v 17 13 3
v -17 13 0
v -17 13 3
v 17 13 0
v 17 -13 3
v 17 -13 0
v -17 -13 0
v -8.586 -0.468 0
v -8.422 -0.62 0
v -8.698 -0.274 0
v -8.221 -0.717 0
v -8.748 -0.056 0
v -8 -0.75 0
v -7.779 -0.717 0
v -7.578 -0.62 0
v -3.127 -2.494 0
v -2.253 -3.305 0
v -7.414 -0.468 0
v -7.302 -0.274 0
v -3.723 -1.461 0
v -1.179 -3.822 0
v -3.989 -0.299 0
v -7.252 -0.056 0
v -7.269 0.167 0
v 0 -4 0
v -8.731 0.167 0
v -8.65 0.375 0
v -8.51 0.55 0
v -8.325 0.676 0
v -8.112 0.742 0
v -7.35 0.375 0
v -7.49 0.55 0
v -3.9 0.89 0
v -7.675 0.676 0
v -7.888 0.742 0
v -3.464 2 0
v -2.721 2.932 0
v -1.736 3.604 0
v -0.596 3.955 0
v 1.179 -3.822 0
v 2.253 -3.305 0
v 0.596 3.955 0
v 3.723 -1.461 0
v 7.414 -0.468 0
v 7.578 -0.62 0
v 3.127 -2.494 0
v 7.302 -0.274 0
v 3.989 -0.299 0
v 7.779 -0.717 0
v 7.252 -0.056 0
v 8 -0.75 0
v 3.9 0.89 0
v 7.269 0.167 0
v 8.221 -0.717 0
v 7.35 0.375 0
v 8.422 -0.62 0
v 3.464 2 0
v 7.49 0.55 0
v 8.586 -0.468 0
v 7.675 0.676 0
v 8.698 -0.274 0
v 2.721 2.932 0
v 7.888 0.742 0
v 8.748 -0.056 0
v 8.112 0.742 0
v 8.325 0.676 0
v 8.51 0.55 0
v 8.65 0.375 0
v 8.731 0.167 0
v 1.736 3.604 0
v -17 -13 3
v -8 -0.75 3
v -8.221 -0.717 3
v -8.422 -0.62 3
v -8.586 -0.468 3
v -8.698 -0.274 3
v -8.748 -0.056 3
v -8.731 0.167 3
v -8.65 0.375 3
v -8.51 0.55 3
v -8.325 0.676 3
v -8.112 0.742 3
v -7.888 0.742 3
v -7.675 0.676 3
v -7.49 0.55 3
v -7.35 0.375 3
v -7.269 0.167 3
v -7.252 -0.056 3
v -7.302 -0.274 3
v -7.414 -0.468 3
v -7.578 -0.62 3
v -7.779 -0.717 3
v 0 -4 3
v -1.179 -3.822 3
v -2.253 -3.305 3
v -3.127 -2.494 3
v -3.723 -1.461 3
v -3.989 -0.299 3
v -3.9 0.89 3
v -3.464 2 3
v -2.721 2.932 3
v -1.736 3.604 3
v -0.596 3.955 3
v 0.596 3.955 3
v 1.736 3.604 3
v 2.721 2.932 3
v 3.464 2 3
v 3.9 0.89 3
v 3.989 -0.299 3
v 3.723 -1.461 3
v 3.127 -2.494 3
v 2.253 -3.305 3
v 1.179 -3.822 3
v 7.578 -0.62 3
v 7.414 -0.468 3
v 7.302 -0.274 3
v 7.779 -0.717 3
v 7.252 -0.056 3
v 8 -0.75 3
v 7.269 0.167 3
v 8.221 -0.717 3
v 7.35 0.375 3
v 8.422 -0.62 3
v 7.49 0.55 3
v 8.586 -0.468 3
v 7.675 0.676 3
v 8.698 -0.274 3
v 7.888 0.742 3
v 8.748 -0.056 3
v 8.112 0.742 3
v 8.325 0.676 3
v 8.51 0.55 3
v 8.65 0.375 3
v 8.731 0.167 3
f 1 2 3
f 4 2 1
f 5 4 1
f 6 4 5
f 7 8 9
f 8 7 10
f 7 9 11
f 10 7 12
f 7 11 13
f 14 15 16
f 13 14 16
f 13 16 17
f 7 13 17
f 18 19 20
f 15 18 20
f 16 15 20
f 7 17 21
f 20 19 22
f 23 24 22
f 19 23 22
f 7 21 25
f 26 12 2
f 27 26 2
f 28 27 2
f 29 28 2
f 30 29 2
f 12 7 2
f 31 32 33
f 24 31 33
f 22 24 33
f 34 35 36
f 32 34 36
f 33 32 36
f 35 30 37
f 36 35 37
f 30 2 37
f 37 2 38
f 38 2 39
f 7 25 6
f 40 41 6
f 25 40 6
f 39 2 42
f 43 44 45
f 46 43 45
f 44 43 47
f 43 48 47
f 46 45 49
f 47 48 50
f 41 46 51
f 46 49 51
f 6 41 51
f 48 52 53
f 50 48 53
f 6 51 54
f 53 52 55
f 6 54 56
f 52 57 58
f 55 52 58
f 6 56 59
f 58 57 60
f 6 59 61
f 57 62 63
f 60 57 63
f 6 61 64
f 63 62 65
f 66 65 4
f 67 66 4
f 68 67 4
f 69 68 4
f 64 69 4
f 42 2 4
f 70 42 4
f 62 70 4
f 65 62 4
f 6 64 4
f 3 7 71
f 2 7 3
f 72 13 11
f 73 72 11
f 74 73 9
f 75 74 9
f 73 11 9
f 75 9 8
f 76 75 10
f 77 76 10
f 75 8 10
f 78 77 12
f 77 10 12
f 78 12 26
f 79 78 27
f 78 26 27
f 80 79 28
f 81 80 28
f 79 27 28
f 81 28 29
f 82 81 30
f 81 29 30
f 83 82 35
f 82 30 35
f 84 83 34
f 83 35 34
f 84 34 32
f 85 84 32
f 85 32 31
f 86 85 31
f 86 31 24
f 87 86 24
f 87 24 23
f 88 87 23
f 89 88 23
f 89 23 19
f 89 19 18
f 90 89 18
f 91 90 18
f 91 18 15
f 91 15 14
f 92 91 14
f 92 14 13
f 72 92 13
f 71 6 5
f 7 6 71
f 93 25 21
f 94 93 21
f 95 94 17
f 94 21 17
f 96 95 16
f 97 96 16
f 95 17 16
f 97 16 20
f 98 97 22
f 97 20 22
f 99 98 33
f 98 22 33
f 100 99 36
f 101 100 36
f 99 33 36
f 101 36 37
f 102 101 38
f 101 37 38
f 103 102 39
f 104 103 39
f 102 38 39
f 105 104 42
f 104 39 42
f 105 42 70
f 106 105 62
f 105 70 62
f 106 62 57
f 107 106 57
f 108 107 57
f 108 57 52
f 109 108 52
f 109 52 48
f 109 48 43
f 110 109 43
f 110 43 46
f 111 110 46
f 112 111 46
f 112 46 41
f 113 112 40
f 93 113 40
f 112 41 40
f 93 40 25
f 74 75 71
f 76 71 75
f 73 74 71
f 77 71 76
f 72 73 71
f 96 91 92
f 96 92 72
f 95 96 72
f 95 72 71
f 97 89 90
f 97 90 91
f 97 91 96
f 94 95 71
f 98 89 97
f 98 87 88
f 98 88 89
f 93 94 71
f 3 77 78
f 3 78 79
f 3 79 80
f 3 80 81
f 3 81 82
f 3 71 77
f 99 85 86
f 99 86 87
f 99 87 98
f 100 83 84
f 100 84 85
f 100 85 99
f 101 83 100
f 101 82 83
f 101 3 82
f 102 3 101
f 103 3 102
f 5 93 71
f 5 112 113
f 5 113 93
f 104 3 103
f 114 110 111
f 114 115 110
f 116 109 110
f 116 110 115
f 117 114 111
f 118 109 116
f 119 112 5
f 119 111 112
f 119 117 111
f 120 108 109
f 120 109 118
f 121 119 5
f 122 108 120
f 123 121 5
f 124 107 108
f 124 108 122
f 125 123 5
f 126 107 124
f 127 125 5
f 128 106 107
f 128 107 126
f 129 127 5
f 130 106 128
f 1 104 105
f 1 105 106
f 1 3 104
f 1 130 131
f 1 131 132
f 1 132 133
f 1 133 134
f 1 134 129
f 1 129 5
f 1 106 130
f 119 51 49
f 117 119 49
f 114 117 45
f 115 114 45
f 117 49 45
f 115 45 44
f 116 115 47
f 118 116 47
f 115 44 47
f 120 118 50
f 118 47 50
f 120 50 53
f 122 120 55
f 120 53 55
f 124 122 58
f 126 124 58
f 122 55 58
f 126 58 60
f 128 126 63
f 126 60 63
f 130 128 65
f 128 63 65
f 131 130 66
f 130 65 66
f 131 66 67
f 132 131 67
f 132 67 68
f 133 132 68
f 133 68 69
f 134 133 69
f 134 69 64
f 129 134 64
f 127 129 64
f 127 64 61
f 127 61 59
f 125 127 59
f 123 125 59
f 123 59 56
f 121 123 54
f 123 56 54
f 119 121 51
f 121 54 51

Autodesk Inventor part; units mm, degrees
ref_plane "YZ Plane" through (0, 0, 0) normal (1, 0, 0) x (0, 1, 0)
ref_plane "XZ Plane" through (0, 0, 0) normal (0, 1, 0) x (-1, 0, 0)
ref_plane "XY Plane" through (0, 0, 0) normal (0, 0, 1) x (1, 0, 0)
sketch "Sketch1" plane through (0, 0, 0) normal (0, 0, 1) x (1, 0, 0)
  line L0 (17, -13) -> (-17, -13)
  line L1 (-17, -13) -> (-17, 13)
  line L2 (-17, 13) -> (17, 13)
  line L3 (17, 13) -> (17, -13)
  line L4 (17, -13) -> (-17, 13) construction
  line L5 (-17, -13) -> (17, 13) construction
  point P0 (0, 0)
  dimension "d0" = 34
  dimension "d1" = 26
extrude "Extrusion1" add sketch "Sketch1" along normal blind 3
sketch "Sketch3" plane through (0, 0, 3) normal (0, 0, 1) x (1, 0, 0)
  point P0 (0, 0)
  point P1 (-8, 0)
  point P2 (8, 0)
  point P3 (0, 6)
  point P4 (0, -6)
  dimension "d4" = 12
  dimension "d5" = 16
  dimension "d6" = 8
  dimension "d7" = 6
hole "Hole1" at (-8, 0, 3) at (8, 0, 3) direction (0, 0, -1) diameter 1.5 end through all
sketch "Sketch4" plane through (0, 0, 3) normal (0, 0, 1) x (1, 0, 0)
  point P0 (0, 0)
  point P1 (0, 0)
hole "Hole2" at (0, 0, 3) direction (0, 0, -1) diameter 8 end through all
equation "\"d6\" = 0.5 * d5"
equation "\"d7\" = 0.5 * d4"
properties part number "Firewall" material "Plywood"
